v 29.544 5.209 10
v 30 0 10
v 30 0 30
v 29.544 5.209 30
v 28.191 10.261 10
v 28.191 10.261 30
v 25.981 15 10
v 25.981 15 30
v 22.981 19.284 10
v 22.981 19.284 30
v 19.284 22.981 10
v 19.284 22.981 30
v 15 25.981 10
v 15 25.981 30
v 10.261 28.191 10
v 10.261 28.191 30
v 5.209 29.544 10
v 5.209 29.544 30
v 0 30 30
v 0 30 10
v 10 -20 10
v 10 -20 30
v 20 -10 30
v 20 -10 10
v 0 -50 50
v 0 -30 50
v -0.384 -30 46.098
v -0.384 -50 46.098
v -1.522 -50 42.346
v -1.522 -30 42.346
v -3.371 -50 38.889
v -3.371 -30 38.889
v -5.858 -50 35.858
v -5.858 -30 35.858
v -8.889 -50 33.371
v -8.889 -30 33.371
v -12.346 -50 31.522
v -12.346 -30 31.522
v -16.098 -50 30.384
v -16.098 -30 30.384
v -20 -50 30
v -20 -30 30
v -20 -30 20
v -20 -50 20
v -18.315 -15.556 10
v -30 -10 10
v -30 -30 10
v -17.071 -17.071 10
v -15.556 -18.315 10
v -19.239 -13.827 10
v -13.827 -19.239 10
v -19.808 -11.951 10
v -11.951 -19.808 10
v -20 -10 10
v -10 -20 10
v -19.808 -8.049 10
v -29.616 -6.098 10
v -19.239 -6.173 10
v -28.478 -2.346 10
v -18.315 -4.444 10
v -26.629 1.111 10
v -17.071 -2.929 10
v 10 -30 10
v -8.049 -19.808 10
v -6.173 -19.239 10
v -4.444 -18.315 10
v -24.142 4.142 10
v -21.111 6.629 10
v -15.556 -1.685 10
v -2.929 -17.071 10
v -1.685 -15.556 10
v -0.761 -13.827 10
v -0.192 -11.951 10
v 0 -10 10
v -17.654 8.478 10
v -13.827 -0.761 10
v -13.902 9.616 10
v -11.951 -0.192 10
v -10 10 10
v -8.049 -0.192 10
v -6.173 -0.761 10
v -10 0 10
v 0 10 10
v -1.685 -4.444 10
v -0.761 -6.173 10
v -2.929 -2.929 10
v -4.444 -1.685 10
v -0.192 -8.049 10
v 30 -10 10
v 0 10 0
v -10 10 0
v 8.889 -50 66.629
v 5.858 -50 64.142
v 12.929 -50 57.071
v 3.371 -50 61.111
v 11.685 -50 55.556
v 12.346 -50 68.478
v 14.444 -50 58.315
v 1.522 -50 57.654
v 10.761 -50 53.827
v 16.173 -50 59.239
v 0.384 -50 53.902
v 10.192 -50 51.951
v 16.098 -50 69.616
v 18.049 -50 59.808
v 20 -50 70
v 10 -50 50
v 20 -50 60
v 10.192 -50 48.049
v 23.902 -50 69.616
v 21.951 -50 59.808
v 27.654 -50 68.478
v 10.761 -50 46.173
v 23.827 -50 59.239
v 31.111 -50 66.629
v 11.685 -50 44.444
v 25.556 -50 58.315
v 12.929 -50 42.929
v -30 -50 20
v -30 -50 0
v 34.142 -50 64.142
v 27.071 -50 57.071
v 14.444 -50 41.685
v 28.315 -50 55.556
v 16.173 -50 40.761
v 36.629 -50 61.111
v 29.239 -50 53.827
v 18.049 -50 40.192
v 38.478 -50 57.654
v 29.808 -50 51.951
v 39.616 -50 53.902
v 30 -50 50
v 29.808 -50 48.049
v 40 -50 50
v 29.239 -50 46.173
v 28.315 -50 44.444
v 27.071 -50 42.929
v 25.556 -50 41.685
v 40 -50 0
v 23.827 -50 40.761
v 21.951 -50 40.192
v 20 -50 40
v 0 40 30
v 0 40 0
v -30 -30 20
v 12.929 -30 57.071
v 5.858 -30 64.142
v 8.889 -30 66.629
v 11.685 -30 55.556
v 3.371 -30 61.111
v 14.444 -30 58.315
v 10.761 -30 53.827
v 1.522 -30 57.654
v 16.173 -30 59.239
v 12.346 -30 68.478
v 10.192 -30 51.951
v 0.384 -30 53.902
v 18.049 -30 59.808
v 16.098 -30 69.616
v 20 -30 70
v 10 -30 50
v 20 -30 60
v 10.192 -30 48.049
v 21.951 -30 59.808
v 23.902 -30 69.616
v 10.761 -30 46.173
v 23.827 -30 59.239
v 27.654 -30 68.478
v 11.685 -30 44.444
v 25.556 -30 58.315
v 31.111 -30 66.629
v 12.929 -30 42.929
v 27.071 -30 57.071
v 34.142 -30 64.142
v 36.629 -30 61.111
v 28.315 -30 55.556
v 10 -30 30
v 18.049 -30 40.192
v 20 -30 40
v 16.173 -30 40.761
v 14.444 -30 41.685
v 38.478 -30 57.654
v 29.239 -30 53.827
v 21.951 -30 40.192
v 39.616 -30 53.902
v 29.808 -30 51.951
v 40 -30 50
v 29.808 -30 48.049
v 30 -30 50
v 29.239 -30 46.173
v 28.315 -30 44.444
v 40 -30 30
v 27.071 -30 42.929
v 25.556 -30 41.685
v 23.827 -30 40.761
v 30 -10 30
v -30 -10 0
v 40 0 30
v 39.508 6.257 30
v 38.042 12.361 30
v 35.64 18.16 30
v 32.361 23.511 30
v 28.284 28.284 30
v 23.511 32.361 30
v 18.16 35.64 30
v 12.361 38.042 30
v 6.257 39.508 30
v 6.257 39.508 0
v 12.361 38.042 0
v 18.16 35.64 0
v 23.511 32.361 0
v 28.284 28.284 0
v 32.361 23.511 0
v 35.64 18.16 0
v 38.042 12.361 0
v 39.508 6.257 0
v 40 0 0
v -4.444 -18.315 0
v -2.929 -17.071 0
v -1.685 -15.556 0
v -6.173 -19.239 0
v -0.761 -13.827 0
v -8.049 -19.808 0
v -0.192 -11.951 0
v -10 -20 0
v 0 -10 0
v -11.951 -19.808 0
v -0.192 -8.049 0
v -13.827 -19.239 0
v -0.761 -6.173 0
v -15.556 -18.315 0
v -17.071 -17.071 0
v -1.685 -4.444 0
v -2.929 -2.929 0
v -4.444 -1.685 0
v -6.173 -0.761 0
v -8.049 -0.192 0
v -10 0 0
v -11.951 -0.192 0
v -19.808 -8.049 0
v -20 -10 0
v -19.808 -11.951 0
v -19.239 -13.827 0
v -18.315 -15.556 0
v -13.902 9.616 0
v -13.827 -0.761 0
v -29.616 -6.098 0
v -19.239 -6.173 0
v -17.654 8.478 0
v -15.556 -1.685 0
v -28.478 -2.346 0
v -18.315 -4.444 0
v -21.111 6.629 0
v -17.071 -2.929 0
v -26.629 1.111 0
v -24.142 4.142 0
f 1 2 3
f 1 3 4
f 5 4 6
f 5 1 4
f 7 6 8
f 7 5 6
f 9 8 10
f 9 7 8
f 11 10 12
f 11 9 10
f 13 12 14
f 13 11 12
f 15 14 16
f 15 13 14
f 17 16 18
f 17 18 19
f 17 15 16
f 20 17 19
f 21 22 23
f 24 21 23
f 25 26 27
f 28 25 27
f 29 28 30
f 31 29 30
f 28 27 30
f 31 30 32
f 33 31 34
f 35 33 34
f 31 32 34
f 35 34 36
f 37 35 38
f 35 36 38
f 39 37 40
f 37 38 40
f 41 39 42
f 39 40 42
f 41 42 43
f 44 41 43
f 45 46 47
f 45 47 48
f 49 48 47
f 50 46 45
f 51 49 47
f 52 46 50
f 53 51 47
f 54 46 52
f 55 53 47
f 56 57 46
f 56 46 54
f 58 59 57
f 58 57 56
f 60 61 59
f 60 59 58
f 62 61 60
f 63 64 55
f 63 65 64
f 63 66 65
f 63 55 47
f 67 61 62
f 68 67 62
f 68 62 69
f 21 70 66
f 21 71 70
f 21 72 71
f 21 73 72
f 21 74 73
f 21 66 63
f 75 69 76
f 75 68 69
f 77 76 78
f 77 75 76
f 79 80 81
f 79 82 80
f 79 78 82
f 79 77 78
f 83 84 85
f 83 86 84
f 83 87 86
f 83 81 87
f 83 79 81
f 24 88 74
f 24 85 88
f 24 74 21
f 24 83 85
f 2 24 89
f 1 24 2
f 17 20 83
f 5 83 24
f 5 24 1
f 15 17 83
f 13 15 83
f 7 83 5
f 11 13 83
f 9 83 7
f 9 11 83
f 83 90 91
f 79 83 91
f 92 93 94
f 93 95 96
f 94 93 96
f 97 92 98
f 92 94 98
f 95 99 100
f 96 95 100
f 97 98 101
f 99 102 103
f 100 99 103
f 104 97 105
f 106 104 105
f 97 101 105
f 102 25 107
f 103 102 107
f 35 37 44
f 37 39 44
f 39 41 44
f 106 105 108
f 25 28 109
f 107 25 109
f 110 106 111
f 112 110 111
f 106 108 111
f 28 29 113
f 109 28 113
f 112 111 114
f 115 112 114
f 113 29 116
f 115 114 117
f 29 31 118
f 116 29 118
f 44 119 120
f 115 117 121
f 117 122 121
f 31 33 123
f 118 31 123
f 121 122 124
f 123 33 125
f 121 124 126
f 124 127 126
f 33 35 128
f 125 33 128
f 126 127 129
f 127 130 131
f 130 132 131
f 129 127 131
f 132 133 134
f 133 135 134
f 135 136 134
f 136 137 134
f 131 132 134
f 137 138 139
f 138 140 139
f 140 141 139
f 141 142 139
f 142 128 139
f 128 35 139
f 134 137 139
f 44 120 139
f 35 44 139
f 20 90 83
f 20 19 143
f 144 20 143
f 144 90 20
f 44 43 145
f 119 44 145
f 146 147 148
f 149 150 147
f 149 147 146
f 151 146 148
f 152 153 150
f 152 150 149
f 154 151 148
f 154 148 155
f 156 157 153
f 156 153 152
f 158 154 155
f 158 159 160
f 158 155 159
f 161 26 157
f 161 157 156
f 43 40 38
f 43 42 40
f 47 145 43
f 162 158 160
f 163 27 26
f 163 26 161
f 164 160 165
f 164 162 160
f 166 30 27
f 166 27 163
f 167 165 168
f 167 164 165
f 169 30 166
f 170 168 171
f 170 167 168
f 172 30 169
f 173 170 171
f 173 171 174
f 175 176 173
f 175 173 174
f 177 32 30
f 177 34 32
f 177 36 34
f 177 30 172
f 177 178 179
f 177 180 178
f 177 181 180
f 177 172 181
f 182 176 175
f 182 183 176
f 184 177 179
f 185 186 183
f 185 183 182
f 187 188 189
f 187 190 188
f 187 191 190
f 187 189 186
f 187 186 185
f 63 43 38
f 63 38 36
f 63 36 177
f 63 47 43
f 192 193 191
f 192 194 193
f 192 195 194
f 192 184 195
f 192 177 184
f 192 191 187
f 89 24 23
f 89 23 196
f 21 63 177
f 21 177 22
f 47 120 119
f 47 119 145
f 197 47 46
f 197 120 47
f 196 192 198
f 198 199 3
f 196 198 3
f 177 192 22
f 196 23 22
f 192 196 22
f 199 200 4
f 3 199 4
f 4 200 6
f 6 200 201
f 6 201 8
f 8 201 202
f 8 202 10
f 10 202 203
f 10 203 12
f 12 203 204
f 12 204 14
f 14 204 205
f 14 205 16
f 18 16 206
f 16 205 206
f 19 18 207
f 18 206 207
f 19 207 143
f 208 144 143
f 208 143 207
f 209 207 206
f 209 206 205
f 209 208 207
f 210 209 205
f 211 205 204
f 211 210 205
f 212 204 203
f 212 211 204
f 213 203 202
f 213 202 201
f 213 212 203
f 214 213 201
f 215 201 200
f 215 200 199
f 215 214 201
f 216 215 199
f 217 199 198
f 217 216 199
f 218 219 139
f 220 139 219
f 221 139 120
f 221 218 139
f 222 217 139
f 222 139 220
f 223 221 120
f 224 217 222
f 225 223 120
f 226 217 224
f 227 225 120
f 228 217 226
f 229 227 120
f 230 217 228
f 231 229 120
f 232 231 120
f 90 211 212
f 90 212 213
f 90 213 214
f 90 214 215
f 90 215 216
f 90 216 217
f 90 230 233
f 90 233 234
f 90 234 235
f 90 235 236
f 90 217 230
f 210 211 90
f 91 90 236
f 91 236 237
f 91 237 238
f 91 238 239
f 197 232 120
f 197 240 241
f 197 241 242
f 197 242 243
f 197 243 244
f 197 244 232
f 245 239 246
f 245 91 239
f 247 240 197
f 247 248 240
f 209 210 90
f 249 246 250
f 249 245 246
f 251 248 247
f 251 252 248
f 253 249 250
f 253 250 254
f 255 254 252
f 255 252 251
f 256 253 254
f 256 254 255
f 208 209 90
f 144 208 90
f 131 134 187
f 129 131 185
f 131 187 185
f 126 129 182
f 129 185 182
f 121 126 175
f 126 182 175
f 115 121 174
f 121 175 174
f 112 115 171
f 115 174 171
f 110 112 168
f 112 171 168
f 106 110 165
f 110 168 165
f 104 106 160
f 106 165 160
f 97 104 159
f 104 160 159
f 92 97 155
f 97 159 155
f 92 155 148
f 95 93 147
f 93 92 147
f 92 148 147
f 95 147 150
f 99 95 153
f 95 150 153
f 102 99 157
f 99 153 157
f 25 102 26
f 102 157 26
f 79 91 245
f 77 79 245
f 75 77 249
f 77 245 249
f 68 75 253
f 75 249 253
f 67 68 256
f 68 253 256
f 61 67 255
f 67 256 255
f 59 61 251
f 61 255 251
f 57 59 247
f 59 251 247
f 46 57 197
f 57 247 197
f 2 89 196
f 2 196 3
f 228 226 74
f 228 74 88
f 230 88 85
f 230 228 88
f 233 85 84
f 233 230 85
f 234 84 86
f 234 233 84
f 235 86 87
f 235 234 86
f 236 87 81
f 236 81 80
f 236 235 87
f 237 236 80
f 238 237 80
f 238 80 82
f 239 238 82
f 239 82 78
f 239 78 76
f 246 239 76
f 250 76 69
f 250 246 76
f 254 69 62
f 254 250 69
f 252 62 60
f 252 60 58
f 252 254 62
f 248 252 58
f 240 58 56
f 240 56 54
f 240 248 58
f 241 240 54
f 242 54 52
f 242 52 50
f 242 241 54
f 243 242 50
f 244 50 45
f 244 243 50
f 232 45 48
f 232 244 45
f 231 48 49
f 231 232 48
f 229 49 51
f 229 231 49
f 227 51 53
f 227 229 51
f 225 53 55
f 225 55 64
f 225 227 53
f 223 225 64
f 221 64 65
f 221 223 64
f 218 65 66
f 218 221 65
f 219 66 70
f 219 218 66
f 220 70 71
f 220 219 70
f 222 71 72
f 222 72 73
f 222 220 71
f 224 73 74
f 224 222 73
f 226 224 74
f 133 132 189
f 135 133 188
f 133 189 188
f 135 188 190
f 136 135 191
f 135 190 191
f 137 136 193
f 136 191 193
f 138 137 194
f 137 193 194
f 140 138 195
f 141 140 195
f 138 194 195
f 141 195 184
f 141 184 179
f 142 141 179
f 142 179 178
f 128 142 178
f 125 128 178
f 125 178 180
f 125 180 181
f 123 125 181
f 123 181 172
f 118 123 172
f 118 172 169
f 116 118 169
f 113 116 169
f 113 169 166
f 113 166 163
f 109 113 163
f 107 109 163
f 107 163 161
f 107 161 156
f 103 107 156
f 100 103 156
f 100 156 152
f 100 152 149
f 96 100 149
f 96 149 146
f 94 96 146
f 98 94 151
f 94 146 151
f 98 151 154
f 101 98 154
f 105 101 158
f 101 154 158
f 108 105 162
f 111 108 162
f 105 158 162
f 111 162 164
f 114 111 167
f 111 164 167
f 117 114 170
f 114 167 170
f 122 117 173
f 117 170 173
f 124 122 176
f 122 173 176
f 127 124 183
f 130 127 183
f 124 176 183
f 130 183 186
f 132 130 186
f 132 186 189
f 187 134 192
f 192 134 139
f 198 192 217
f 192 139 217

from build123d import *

# Parameters (mm, degrees)
BOSS_EXTRUDE1_DEPTH = 30
SKETCH2_R           = 10
BOSS_EXTRUDE2_DEPTH = 10
SKETCH3_W           = 70
SKETCH3_H           = 20
BOSS_EXTRUDE3_DEPTH = 70
CUT_EXTRUDE1_DEPTH  = 50
SKETCH6_R           = 10
CUT_EXTRUDE2_DEPTH  = 50


with BuildPart() as part:
    # Sketch1 → Boss-Extrude1 (new body)
    with BuildSketch(Plane.XY):
        with BuildLine():
            Line((0, 30), (0, 40))
            ThreePointArc((0, 40), (28.284271247, 28.284271247), (40, 0))
            Line((40, 0), (40, -30))
            Line((40, -30), (10, -30))
            Line((10, -30), (10, -20))
            Line((10, -20), (20, -10))
            Line((20, -10), (30, -10))
            Line((30, -10), (30, 0))
            ThreePointArc((30, 0), (21.213203436, 21.213203436), (0, 30))
        make_face()
    extrude(amount=BOSS_EXTRUDE1_DEPTH)

    # Sketch2 → Boss-Extrude2 (add)
    with BuildSketch(Plane.XY):
        with BuildLine():
            Line((0, 40), (0, 10))
            Line((0, 10), (-10, 10))
            ThreePointArc((-10, 10), (-24.142135624, 4.142135624), (-30, -10))
            Line((-30, -10), (-30, -50))
            Line((-30, -50), (40, -50))
            Line((40, -50), (40, 0))
            ThreePointArc((40, 0), (28.284271247, 28.284271247), (0, 40))
        make_face()
        with Locations((-10, -10)):
            Circle(SKETCH2_R, mode=Mode.SUBTRACT)
    extrude(amount=BOSS_EXTRUDE2_DEPTH)

    # Sketch3 → Boss-Extrude3 (add)
    with BuildSketch(Plane.XY.offset(10)):
        with Locations((5, -40)):
            Rectangle(SKETCH3_W, SKETCH3_H)
    extrude(amount=BOSS_EXTRUDE3_DEPTH)

    # Sketch4 → Cut-Extrude1 (cut)
    with BuildSketch(Plane(origin=(0, -30, 0), x_dir=(1, 0, 0), z_dir=(0, 1, 0))):
        with BuildLine():
            Line((-20, -30), (-20, -20))
            Line((-20, -20), (-30, -20))
            Line((-30, -20), (-30, -80))
            Line((-30, -80), (40, -80))
            Line((40, -80), (40, -50))
            ThreePointArc((40, -50), (20, -70), (0, -50))
            ThreePointArc((0, -50), (-5.857864376, -35.857864376), (-20, -30))
        make_face()
    extrude(amount=-CUT_EXTRUDE1_DEPTH, mode=Mode.SUBTRACT)

    # Sketch6 → Cut-Extrude2 (cut)
    with BuildSketch(Plane(origin=(0, -30, 0), x_dir=(1, 0, 0), z_dir=(0, 1, 0))):
        with Locations((20, -50)):
            Circle(SKETCH6_R)
    extrude(amount=-CUT_EXTRUDE2_DEPTH, mode=Mode.SUBTRACT)


solid = part.part
